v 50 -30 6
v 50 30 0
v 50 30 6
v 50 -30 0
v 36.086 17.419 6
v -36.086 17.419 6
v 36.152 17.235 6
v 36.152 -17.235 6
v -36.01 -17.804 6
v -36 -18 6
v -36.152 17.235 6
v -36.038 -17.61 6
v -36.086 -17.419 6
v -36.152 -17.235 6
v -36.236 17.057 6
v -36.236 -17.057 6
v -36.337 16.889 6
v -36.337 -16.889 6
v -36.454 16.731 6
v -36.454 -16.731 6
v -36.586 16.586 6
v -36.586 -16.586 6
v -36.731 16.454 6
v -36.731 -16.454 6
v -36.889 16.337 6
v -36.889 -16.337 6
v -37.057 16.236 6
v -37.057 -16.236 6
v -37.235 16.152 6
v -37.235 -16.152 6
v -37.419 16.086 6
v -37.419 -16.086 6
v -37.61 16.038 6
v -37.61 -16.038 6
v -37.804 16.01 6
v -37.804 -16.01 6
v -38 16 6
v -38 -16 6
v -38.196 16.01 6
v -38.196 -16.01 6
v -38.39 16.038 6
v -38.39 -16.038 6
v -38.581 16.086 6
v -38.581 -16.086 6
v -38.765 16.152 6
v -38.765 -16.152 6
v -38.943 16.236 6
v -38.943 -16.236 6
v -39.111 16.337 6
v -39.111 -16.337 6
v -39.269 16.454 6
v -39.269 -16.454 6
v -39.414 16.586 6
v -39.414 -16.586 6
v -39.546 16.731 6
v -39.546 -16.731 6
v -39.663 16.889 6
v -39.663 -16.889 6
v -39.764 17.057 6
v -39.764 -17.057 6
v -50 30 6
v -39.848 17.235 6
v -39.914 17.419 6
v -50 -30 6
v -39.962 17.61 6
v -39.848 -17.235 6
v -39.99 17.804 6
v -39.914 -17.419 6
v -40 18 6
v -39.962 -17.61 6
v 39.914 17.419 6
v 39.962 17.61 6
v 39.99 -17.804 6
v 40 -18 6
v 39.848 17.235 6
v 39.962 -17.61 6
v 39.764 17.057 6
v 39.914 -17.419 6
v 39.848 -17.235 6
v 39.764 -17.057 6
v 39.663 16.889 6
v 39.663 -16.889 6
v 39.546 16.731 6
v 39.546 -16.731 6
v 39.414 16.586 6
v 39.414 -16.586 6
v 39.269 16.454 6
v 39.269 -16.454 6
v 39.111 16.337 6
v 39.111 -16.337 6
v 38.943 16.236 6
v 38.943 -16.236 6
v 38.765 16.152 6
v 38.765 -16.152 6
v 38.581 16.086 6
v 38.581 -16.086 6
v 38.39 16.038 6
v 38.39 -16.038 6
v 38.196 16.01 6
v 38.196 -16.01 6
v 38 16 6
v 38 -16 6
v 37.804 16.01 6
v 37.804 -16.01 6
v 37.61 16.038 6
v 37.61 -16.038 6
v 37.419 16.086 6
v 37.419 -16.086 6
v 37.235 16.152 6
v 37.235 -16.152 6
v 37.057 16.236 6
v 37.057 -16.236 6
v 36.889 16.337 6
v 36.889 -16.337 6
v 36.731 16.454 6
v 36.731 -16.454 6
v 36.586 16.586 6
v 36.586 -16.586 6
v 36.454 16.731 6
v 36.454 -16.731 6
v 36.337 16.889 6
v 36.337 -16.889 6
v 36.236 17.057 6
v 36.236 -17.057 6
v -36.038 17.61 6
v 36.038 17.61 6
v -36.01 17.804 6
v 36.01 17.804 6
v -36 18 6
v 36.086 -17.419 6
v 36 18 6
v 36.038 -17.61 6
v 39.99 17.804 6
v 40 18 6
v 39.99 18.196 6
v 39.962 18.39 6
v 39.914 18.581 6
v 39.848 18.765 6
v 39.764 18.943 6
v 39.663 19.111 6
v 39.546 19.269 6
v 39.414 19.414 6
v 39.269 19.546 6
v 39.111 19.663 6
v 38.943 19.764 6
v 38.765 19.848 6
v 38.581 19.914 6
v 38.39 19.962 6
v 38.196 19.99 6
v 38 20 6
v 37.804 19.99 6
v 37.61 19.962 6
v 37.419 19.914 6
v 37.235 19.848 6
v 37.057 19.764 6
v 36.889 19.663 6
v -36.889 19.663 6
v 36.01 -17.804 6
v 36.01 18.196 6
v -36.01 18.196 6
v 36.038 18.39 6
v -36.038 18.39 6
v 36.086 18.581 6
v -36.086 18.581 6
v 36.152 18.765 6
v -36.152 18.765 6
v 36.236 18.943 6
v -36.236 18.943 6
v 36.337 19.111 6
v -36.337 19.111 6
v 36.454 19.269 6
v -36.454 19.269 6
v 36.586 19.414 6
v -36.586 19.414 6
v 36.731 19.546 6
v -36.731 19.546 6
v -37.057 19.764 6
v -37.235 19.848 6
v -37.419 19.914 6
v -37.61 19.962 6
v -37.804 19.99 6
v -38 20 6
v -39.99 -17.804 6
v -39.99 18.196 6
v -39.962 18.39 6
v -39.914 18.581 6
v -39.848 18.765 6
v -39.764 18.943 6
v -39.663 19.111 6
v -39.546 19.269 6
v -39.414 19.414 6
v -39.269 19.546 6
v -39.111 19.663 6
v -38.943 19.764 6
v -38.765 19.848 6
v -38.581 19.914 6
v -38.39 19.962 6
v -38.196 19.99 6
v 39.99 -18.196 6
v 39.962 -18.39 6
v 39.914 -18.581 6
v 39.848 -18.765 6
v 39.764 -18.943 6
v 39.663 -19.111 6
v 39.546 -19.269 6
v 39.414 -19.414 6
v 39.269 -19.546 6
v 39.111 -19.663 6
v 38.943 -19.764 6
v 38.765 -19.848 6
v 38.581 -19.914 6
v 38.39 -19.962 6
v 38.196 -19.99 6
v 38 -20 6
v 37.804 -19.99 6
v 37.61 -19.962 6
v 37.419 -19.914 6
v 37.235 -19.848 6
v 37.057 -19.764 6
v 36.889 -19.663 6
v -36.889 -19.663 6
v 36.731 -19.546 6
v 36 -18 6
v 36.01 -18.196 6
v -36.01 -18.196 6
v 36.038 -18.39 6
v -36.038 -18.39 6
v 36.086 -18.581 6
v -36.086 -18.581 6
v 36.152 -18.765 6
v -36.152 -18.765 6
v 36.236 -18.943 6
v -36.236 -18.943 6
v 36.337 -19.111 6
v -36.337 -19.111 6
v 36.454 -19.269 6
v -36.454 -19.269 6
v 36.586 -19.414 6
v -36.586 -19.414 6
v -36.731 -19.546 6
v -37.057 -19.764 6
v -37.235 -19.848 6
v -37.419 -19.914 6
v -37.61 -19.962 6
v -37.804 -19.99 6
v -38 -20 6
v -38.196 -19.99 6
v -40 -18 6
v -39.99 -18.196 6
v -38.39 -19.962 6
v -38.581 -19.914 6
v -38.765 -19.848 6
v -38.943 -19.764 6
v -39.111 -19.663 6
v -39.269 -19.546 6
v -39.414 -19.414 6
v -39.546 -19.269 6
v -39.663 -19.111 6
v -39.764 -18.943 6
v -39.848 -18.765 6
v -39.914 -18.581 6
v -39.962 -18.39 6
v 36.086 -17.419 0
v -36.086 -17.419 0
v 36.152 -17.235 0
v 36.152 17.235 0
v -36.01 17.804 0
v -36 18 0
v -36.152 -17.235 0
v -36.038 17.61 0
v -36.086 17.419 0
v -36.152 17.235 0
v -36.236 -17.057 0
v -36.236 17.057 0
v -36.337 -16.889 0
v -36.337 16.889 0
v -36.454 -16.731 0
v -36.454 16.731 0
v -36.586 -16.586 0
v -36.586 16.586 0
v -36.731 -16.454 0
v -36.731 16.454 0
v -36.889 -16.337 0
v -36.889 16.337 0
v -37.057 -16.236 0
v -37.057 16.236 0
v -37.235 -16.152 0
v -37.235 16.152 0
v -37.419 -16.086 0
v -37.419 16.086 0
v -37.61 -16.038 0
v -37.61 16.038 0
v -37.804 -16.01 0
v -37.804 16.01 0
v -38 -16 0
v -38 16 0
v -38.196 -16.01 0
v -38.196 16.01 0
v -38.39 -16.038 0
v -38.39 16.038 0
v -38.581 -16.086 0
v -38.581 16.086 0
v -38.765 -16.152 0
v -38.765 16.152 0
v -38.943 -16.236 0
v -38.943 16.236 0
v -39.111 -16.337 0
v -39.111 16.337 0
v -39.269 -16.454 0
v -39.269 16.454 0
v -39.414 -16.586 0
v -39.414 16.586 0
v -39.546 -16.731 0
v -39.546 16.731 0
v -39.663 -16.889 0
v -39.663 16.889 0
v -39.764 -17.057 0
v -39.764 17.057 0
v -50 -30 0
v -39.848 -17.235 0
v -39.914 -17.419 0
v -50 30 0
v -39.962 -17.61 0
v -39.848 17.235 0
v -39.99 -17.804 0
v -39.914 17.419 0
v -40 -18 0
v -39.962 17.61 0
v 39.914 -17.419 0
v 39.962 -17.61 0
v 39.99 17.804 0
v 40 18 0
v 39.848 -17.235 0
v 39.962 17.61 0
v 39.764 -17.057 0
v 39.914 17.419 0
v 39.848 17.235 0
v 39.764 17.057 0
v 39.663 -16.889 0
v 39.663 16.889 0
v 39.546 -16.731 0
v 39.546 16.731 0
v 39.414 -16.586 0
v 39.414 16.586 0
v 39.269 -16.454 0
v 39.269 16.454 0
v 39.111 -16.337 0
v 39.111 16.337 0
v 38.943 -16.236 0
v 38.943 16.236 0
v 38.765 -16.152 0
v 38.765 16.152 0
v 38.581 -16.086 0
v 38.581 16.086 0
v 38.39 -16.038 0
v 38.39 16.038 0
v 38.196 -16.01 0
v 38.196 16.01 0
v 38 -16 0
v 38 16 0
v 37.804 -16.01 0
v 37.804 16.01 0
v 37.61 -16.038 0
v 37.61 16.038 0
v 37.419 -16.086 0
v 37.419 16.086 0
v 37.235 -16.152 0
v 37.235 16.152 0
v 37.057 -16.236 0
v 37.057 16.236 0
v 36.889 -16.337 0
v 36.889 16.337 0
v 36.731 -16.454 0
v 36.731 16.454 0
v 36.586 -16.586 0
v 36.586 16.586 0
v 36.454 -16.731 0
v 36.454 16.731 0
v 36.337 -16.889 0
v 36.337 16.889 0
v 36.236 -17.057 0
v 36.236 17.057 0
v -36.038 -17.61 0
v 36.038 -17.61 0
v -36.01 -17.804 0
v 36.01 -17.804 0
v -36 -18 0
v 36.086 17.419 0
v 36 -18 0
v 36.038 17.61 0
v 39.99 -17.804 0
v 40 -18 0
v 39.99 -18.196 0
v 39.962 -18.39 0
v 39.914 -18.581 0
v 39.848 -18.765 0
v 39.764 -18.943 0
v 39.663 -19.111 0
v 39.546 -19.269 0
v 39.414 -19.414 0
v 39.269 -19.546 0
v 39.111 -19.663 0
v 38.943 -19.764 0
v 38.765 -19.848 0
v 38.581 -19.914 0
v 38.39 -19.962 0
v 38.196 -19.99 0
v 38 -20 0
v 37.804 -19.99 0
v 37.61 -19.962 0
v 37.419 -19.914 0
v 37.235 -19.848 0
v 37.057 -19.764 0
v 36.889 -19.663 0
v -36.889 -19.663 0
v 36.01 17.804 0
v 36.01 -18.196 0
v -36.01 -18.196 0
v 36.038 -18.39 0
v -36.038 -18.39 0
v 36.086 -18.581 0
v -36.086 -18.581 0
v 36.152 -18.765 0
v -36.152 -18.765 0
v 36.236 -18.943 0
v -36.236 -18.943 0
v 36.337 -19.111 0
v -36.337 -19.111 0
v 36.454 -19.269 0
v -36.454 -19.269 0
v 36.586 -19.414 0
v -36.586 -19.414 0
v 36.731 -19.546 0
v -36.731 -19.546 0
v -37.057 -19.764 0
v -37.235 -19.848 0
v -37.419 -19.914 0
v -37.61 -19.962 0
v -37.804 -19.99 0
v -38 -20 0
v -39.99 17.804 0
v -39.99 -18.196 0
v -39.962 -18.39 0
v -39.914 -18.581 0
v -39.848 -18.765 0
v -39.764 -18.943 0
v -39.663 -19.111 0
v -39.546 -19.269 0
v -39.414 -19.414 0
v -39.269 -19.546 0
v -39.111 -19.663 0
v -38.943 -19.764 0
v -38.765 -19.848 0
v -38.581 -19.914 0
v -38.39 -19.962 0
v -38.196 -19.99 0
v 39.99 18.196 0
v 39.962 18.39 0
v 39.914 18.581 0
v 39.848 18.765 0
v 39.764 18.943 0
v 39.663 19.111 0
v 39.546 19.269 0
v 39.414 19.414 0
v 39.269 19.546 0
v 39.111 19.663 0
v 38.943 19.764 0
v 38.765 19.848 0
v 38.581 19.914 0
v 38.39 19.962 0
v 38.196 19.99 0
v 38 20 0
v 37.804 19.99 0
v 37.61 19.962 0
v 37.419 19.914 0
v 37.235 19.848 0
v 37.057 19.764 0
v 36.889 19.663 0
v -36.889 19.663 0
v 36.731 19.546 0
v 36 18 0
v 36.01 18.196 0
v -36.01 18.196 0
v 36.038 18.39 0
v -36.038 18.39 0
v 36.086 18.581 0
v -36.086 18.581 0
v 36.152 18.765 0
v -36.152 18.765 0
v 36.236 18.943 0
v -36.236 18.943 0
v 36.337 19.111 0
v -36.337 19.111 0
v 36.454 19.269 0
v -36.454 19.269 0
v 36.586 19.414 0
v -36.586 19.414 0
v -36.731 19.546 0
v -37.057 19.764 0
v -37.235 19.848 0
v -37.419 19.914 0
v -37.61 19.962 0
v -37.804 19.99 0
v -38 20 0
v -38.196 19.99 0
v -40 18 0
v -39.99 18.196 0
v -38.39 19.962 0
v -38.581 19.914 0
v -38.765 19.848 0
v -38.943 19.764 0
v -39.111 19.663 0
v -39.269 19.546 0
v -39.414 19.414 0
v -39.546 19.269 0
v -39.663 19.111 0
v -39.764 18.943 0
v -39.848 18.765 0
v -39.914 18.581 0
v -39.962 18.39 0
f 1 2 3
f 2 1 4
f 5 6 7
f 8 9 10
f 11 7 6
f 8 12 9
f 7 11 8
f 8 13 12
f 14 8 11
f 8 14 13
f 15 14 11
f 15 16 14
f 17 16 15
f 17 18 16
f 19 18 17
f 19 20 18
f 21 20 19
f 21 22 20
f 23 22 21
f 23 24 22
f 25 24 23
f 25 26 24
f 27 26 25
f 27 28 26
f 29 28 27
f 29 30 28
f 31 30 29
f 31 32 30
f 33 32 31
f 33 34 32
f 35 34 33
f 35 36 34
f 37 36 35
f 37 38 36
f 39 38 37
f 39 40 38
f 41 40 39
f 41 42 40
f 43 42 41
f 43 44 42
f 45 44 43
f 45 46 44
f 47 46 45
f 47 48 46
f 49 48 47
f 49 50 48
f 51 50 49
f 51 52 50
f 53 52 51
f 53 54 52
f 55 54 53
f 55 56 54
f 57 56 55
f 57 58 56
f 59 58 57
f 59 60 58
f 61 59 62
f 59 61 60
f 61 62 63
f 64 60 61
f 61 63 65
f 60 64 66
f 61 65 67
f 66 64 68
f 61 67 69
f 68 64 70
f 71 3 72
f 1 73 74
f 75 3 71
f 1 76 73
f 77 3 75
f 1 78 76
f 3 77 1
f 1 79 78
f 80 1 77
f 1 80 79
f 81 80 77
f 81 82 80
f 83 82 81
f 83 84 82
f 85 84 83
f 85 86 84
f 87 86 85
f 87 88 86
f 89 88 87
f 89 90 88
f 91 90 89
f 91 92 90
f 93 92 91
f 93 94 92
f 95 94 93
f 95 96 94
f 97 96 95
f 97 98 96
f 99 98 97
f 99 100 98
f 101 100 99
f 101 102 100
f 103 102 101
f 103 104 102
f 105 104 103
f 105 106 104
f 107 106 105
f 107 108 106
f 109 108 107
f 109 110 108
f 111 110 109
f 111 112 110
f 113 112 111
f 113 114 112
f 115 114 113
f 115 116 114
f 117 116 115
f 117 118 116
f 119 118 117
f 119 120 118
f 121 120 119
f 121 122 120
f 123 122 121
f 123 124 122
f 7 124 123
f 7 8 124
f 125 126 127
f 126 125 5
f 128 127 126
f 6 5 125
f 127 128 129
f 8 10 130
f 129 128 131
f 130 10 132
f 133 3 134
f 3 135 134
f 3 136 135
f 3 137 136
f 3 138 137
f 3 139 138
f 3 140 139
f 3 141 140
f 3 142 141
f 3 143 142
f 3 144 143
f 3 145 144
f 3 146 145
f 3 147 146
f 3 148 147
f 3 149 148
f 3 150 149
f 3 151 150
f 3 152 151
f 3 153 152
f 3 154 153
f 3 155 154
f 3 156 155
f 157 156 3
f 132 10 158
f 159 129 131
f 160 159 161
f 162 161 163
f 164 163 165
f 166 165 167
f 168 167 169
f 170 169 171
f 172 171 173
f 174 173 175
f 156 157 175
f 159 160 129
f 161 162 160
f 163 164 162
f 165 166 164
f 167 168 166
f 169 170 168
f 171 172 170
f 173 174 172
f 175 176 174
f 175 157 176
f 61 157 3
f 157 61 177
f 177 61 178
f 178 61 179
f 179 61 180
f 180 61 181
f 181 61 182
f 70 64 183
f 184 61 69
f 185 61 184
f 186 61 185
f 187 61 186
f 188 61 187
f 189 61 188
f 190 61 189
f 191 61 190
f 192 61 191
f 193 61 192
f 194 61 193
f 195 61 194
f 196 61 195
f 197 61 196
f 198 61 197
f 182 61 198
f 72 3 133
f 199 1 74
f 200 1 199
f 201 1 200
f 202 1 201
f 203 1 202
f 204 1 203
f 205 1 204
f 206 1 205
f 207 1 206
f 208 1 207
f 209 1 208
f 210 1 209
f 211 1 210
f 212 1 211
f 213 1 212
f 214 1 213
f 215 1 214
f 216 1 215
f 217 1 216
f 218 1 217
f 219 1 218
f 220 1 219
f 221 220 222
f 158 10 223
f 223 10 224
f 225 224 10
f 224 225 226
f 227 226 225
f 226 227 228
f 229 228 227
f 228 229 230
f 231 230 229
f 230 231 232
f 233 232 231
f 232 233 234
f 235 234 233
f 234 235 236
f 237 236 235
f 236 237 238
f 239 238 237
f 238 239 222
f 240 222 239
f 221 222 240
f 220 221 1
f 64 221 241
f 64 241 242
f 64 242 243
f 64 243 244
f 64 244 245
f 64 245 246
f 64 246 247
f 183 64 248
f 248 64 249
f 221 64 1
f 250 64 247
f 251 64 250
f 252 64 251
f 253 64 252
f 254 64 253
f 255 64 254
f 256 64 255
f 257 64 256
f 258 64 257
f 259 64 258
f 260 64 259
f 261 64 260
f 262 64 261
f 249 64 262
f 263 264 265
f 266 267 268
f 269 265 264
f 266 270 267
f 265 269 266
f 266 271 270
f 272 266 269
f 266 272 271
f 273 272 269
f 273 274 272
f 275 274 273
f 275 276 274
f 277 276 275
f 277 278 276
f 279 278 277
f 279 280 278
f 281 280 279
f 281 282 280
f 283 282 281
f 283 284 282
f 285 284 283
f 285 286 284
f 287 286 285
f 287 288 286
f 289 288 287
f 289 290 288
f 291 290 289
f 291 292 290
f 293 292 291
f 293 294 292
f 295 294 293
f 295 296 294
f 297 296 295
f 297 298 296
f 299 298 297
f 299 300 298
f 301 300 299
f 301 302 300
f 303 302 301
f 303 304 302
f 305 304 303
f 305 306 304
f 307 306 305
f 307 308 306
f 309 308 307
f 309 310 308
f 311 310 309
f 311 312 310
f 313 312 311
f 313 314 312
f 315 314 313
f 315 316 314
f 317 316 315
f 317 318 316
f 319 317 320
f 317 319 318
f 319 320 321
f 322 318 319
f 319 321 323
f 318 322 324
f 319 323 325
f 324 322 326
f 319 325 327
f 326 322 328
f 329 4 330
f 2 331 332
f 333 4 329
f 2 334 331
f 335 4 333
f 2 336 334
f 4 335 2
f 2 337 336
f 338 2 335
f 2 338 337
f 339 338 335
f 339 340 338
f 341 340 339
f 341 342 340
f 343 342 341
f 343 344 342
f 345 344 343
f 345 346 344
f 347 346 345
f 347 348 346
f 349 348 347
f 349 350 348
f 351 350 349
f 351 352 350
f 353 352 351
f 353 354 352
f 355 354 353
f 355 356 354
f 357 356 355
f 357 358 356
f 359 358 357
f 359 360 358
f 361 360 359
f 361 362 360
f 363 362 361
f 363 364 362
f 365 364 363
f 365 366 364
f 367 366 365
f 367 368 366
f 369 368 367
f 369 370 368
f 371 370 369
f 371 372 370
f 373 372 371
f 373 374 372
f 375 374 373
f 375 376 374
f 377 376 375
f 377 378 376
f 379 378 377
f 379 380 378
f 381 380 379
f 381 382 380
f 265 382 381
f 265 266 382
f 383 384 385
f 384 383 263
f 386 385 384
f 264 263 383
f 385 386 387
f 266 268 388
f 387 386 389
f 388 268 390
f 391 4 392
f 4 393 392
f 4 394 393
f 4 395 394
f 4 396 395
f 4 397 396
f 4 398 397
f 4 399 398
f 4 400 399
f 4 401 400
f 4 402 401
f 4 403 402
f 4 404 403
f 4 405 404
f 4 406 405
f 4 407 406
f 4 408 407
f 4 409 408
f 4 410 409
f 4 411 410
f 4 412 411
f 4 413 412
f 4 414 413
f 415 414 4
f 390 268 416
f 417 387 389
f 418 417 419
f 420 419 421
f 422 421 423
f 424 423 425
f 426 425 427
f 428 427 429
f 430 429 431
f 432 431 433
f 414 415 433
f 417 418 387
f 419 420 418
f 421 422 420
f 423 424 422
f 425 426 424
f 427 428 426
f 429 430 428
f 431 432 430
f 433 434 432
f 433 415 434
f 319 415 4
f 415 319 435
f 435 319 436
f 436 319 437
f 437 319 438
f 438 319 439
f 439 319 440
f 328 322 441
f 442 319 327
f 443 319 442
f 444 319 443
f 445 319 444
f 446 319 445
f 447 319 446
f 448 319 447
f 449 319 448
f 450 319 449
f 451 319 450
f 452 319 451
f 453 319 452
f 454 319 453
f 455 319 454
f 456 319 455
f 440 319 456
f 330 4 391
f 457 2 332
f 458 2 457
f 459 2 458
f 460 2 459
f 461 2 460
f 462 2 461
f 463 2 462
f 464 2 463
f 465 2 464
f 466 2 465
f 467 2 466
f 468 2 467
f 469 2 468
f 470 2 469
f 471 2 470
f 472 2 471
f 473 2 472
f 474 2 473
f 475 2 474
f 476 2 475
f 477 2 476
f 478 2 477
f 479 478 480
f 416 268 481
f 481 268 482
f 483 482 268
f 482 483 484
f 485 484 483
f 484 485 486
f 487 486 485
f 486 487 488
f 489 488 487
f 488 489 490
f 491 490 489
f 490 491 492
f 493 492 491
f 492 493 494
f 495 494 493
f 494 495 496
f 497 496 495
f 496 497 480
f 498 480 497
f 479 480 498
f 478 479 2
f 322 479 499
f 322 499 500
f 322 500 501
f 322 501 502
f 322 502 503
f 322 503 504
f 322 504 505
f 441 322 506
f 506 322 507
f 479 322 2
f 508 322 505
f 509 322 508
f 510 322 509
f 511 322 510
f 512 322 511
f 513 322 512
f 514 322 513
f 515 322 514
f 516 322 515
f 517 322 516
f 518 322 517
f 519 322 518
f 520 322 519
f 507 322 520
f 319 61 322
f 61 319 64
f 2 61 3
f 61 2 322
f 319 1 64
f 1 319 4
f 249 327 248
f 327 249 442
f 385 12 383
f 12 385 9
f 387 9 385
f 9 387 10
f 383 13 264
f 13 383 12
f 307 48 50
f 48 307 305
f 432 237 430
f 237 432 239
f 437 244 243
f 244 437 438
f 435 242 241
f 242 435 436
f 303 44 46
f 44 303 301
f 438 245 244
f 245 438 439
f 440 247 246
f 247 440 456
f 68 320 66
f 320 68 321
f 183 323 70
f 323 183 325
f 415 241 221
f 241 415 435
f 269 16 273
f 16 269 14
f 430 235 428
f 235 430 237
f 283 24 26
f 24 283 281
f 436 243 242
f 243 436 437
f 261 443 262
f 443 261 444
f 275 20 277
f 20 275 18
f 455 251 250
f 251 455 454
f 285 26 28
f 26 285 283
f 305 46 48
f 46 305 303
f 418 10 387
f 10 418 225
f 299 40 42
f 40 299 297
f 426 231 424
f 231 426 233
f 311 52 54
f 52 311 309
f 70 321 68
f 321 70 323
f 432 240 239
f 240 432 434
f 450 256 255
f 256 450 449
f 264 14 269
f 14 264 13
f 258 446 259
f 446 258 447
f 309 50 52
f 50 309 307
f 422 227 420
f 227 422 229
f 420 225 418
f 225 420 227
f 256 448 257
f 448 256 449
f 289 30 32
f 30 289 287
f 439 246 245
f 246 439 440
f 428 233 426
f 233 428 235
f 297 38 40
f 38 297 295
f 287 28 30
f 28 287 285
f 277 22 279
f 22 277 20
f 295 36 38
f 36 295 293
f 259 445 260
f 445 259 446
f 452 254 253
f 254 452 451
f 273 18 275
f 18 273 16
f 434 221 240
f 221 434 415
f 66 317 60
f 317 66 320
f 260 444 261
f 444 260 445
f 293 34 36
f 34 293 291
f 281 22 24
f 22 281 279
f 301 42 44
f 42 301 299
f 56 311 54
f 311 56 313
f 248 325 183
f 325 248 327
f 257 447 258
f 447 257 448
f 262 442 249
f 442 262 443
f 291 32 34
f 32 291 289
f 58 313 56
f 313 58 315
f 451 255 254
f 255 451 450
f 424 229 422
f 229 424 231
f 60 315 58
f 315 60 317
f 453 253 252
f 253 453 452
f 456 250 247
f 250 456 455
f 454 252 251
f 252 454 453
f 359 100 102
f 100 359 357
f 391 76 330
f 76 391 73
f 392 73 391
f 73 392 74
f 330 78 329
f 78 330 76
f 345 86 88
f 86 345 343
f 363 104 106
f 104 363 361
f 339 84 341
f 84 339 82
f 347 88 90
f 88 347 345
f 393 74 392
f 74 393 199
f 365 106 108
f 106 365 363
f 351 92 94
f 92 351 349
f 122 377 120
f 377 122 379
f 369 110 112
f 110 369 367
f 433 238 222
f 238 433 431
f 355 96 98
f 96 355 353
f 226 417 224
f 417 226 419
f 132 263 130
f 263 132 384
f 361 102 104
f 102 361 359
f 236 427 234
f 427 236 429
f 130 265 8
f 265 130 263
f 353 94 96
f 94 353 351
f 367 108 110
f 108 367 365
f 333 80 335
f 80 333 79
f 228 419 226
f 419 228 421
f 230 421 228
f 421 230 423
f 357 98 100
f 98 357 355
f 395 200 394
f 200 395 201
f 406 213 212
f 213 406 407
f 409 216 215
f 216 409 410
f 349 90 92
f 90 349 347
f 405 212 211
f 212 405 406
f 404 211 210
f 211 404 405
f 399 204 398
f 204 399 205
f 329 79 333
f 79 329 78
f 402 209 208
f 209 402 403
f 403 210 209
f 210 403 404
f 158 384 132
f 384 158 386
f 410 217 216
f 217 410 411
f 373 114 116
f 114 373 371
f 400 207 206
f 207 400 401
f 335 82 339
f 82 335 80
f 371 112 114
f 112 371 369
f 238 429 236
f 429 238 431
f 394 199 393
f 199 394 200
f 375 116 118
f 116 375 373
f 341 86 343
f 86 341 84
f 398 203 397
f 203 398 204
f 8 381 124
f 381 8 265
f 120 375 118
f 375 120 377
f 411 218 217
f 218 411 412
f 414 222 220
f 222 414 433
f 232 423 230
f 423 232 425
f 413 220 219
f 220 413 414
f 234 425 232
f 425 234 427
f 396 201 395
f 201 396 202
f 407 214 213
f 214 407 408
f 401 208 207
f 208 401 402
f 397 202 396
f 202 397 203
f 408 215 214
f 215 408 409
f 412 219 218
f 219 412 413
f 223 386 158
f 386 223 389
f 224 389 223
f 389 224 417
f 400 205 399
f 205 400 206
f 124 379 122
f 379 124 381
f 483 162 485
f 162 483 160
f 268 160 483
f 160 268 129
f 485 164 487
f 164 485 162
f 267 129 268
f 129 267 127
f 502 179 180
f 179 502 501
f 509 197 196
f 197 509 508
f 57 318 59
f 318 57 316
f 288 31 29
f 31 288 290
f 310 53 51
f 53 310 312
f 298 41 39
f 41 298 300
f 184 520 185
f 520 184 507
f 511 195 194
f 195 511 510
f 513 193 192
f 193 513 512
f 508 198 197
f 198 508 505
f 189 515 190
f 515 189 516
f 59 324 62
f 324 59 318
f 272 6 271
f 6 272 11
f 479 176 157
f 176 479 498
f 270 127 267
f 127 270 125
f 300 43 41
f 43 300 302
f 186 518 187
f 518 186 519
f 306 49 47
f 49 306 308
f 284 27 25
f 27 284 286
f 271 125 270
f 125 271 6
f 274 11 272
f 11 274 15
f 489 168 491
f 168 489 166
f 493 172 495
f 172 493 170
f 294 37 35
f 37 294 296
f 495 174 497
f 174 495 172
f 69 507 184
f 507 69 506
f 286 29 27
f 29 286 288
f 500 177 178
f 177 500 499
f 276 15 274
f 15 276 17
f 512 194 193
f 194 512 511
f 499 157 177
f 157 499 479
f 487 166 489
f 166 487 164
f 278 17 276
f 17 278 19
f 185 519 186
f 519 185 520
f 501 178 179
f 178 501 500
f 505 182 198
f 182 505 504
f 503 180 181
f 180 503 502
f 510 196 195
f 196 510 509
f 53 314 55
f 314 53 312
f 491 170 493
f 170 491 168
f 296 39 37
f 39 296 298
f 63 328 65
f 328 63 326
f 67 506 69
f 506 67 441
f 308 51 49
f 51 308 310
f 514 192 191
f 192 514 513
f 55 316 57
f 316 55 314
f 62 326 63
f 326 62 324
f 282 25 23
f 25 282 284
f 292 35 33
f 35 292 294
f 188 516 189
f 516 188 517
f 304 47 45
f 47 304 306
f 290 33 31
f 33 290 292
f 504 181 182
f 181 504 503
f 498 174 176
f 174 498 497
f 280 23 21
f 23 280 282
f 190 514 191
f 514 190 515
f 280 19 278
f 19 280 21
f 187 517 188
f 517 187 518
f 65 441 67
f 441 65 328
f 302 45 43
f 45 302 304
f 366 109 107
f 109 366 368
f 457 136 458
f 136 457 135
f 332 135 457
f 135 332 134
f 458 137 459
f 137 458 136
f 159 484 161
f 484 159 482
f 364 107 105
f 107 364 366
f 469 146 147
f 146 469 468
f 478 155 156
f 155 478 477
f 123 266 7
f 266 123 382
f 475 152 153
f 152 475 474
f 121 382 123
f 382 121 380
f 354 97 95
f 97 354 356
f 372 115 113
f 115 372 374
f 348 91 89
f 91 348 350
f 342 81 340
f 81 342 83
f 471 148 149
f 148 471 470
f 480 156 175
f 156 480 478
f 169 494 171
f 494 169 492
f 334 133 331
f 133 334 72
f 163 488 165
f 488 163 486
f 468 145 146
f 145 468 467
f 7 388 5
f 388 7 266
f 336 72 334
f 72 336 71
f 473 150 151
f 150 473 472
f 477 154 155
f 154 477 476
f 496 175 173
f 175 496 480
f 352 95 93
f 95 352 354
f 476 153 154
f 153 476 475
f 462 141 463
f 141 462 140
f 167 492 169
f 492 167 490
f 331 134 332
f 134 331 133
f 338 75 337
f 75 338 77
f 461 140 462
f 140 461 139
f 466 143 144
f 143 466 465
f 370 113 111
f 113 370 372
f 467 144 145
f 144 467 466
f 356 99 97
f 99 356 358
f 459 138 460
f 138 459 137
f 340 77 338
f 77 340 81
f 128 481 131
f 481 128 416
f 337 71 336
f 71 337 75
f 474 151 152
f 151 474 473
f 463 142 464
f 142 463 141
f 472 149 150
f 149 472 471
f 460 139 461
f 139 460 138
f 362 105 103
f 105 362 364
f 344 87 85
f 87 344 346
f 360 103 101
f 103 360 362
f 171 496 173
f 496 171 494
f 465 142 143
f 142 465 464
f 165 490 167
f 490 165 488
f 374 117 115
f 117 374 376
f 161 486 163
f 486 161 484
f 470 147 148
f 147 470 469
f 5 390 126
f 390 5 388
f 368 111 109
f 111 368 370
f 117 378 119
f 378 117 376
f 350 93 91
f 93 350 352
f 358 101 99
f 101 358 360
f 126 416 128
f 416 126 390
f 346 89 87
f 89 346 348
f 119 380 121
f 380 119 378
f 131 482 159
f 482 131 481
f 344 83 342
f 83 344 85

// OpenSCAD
// Generated with SolidPython2 for OpenSCAD task-002
$fn = 64;

difference() {
	translate(v = [-50.0, -30.0, 0]) {
		cube(size = [100, 60, 6]);
	}
	translate(v = [-38, -18, -1]) {
		cylinder(h = 8, r = 2.0);
	}
	translate(v = [38, -18, -1]) {
		cylinder(h = 8, r = 2.0);
	}
	translate(v = [-38, 18, -1]) {
		cylinder(h = 8, r = 2.0);
	}
	translate(v = [38, 18, -1]) {
		cylinder(h = 8, r = 2.0);
	}
}
